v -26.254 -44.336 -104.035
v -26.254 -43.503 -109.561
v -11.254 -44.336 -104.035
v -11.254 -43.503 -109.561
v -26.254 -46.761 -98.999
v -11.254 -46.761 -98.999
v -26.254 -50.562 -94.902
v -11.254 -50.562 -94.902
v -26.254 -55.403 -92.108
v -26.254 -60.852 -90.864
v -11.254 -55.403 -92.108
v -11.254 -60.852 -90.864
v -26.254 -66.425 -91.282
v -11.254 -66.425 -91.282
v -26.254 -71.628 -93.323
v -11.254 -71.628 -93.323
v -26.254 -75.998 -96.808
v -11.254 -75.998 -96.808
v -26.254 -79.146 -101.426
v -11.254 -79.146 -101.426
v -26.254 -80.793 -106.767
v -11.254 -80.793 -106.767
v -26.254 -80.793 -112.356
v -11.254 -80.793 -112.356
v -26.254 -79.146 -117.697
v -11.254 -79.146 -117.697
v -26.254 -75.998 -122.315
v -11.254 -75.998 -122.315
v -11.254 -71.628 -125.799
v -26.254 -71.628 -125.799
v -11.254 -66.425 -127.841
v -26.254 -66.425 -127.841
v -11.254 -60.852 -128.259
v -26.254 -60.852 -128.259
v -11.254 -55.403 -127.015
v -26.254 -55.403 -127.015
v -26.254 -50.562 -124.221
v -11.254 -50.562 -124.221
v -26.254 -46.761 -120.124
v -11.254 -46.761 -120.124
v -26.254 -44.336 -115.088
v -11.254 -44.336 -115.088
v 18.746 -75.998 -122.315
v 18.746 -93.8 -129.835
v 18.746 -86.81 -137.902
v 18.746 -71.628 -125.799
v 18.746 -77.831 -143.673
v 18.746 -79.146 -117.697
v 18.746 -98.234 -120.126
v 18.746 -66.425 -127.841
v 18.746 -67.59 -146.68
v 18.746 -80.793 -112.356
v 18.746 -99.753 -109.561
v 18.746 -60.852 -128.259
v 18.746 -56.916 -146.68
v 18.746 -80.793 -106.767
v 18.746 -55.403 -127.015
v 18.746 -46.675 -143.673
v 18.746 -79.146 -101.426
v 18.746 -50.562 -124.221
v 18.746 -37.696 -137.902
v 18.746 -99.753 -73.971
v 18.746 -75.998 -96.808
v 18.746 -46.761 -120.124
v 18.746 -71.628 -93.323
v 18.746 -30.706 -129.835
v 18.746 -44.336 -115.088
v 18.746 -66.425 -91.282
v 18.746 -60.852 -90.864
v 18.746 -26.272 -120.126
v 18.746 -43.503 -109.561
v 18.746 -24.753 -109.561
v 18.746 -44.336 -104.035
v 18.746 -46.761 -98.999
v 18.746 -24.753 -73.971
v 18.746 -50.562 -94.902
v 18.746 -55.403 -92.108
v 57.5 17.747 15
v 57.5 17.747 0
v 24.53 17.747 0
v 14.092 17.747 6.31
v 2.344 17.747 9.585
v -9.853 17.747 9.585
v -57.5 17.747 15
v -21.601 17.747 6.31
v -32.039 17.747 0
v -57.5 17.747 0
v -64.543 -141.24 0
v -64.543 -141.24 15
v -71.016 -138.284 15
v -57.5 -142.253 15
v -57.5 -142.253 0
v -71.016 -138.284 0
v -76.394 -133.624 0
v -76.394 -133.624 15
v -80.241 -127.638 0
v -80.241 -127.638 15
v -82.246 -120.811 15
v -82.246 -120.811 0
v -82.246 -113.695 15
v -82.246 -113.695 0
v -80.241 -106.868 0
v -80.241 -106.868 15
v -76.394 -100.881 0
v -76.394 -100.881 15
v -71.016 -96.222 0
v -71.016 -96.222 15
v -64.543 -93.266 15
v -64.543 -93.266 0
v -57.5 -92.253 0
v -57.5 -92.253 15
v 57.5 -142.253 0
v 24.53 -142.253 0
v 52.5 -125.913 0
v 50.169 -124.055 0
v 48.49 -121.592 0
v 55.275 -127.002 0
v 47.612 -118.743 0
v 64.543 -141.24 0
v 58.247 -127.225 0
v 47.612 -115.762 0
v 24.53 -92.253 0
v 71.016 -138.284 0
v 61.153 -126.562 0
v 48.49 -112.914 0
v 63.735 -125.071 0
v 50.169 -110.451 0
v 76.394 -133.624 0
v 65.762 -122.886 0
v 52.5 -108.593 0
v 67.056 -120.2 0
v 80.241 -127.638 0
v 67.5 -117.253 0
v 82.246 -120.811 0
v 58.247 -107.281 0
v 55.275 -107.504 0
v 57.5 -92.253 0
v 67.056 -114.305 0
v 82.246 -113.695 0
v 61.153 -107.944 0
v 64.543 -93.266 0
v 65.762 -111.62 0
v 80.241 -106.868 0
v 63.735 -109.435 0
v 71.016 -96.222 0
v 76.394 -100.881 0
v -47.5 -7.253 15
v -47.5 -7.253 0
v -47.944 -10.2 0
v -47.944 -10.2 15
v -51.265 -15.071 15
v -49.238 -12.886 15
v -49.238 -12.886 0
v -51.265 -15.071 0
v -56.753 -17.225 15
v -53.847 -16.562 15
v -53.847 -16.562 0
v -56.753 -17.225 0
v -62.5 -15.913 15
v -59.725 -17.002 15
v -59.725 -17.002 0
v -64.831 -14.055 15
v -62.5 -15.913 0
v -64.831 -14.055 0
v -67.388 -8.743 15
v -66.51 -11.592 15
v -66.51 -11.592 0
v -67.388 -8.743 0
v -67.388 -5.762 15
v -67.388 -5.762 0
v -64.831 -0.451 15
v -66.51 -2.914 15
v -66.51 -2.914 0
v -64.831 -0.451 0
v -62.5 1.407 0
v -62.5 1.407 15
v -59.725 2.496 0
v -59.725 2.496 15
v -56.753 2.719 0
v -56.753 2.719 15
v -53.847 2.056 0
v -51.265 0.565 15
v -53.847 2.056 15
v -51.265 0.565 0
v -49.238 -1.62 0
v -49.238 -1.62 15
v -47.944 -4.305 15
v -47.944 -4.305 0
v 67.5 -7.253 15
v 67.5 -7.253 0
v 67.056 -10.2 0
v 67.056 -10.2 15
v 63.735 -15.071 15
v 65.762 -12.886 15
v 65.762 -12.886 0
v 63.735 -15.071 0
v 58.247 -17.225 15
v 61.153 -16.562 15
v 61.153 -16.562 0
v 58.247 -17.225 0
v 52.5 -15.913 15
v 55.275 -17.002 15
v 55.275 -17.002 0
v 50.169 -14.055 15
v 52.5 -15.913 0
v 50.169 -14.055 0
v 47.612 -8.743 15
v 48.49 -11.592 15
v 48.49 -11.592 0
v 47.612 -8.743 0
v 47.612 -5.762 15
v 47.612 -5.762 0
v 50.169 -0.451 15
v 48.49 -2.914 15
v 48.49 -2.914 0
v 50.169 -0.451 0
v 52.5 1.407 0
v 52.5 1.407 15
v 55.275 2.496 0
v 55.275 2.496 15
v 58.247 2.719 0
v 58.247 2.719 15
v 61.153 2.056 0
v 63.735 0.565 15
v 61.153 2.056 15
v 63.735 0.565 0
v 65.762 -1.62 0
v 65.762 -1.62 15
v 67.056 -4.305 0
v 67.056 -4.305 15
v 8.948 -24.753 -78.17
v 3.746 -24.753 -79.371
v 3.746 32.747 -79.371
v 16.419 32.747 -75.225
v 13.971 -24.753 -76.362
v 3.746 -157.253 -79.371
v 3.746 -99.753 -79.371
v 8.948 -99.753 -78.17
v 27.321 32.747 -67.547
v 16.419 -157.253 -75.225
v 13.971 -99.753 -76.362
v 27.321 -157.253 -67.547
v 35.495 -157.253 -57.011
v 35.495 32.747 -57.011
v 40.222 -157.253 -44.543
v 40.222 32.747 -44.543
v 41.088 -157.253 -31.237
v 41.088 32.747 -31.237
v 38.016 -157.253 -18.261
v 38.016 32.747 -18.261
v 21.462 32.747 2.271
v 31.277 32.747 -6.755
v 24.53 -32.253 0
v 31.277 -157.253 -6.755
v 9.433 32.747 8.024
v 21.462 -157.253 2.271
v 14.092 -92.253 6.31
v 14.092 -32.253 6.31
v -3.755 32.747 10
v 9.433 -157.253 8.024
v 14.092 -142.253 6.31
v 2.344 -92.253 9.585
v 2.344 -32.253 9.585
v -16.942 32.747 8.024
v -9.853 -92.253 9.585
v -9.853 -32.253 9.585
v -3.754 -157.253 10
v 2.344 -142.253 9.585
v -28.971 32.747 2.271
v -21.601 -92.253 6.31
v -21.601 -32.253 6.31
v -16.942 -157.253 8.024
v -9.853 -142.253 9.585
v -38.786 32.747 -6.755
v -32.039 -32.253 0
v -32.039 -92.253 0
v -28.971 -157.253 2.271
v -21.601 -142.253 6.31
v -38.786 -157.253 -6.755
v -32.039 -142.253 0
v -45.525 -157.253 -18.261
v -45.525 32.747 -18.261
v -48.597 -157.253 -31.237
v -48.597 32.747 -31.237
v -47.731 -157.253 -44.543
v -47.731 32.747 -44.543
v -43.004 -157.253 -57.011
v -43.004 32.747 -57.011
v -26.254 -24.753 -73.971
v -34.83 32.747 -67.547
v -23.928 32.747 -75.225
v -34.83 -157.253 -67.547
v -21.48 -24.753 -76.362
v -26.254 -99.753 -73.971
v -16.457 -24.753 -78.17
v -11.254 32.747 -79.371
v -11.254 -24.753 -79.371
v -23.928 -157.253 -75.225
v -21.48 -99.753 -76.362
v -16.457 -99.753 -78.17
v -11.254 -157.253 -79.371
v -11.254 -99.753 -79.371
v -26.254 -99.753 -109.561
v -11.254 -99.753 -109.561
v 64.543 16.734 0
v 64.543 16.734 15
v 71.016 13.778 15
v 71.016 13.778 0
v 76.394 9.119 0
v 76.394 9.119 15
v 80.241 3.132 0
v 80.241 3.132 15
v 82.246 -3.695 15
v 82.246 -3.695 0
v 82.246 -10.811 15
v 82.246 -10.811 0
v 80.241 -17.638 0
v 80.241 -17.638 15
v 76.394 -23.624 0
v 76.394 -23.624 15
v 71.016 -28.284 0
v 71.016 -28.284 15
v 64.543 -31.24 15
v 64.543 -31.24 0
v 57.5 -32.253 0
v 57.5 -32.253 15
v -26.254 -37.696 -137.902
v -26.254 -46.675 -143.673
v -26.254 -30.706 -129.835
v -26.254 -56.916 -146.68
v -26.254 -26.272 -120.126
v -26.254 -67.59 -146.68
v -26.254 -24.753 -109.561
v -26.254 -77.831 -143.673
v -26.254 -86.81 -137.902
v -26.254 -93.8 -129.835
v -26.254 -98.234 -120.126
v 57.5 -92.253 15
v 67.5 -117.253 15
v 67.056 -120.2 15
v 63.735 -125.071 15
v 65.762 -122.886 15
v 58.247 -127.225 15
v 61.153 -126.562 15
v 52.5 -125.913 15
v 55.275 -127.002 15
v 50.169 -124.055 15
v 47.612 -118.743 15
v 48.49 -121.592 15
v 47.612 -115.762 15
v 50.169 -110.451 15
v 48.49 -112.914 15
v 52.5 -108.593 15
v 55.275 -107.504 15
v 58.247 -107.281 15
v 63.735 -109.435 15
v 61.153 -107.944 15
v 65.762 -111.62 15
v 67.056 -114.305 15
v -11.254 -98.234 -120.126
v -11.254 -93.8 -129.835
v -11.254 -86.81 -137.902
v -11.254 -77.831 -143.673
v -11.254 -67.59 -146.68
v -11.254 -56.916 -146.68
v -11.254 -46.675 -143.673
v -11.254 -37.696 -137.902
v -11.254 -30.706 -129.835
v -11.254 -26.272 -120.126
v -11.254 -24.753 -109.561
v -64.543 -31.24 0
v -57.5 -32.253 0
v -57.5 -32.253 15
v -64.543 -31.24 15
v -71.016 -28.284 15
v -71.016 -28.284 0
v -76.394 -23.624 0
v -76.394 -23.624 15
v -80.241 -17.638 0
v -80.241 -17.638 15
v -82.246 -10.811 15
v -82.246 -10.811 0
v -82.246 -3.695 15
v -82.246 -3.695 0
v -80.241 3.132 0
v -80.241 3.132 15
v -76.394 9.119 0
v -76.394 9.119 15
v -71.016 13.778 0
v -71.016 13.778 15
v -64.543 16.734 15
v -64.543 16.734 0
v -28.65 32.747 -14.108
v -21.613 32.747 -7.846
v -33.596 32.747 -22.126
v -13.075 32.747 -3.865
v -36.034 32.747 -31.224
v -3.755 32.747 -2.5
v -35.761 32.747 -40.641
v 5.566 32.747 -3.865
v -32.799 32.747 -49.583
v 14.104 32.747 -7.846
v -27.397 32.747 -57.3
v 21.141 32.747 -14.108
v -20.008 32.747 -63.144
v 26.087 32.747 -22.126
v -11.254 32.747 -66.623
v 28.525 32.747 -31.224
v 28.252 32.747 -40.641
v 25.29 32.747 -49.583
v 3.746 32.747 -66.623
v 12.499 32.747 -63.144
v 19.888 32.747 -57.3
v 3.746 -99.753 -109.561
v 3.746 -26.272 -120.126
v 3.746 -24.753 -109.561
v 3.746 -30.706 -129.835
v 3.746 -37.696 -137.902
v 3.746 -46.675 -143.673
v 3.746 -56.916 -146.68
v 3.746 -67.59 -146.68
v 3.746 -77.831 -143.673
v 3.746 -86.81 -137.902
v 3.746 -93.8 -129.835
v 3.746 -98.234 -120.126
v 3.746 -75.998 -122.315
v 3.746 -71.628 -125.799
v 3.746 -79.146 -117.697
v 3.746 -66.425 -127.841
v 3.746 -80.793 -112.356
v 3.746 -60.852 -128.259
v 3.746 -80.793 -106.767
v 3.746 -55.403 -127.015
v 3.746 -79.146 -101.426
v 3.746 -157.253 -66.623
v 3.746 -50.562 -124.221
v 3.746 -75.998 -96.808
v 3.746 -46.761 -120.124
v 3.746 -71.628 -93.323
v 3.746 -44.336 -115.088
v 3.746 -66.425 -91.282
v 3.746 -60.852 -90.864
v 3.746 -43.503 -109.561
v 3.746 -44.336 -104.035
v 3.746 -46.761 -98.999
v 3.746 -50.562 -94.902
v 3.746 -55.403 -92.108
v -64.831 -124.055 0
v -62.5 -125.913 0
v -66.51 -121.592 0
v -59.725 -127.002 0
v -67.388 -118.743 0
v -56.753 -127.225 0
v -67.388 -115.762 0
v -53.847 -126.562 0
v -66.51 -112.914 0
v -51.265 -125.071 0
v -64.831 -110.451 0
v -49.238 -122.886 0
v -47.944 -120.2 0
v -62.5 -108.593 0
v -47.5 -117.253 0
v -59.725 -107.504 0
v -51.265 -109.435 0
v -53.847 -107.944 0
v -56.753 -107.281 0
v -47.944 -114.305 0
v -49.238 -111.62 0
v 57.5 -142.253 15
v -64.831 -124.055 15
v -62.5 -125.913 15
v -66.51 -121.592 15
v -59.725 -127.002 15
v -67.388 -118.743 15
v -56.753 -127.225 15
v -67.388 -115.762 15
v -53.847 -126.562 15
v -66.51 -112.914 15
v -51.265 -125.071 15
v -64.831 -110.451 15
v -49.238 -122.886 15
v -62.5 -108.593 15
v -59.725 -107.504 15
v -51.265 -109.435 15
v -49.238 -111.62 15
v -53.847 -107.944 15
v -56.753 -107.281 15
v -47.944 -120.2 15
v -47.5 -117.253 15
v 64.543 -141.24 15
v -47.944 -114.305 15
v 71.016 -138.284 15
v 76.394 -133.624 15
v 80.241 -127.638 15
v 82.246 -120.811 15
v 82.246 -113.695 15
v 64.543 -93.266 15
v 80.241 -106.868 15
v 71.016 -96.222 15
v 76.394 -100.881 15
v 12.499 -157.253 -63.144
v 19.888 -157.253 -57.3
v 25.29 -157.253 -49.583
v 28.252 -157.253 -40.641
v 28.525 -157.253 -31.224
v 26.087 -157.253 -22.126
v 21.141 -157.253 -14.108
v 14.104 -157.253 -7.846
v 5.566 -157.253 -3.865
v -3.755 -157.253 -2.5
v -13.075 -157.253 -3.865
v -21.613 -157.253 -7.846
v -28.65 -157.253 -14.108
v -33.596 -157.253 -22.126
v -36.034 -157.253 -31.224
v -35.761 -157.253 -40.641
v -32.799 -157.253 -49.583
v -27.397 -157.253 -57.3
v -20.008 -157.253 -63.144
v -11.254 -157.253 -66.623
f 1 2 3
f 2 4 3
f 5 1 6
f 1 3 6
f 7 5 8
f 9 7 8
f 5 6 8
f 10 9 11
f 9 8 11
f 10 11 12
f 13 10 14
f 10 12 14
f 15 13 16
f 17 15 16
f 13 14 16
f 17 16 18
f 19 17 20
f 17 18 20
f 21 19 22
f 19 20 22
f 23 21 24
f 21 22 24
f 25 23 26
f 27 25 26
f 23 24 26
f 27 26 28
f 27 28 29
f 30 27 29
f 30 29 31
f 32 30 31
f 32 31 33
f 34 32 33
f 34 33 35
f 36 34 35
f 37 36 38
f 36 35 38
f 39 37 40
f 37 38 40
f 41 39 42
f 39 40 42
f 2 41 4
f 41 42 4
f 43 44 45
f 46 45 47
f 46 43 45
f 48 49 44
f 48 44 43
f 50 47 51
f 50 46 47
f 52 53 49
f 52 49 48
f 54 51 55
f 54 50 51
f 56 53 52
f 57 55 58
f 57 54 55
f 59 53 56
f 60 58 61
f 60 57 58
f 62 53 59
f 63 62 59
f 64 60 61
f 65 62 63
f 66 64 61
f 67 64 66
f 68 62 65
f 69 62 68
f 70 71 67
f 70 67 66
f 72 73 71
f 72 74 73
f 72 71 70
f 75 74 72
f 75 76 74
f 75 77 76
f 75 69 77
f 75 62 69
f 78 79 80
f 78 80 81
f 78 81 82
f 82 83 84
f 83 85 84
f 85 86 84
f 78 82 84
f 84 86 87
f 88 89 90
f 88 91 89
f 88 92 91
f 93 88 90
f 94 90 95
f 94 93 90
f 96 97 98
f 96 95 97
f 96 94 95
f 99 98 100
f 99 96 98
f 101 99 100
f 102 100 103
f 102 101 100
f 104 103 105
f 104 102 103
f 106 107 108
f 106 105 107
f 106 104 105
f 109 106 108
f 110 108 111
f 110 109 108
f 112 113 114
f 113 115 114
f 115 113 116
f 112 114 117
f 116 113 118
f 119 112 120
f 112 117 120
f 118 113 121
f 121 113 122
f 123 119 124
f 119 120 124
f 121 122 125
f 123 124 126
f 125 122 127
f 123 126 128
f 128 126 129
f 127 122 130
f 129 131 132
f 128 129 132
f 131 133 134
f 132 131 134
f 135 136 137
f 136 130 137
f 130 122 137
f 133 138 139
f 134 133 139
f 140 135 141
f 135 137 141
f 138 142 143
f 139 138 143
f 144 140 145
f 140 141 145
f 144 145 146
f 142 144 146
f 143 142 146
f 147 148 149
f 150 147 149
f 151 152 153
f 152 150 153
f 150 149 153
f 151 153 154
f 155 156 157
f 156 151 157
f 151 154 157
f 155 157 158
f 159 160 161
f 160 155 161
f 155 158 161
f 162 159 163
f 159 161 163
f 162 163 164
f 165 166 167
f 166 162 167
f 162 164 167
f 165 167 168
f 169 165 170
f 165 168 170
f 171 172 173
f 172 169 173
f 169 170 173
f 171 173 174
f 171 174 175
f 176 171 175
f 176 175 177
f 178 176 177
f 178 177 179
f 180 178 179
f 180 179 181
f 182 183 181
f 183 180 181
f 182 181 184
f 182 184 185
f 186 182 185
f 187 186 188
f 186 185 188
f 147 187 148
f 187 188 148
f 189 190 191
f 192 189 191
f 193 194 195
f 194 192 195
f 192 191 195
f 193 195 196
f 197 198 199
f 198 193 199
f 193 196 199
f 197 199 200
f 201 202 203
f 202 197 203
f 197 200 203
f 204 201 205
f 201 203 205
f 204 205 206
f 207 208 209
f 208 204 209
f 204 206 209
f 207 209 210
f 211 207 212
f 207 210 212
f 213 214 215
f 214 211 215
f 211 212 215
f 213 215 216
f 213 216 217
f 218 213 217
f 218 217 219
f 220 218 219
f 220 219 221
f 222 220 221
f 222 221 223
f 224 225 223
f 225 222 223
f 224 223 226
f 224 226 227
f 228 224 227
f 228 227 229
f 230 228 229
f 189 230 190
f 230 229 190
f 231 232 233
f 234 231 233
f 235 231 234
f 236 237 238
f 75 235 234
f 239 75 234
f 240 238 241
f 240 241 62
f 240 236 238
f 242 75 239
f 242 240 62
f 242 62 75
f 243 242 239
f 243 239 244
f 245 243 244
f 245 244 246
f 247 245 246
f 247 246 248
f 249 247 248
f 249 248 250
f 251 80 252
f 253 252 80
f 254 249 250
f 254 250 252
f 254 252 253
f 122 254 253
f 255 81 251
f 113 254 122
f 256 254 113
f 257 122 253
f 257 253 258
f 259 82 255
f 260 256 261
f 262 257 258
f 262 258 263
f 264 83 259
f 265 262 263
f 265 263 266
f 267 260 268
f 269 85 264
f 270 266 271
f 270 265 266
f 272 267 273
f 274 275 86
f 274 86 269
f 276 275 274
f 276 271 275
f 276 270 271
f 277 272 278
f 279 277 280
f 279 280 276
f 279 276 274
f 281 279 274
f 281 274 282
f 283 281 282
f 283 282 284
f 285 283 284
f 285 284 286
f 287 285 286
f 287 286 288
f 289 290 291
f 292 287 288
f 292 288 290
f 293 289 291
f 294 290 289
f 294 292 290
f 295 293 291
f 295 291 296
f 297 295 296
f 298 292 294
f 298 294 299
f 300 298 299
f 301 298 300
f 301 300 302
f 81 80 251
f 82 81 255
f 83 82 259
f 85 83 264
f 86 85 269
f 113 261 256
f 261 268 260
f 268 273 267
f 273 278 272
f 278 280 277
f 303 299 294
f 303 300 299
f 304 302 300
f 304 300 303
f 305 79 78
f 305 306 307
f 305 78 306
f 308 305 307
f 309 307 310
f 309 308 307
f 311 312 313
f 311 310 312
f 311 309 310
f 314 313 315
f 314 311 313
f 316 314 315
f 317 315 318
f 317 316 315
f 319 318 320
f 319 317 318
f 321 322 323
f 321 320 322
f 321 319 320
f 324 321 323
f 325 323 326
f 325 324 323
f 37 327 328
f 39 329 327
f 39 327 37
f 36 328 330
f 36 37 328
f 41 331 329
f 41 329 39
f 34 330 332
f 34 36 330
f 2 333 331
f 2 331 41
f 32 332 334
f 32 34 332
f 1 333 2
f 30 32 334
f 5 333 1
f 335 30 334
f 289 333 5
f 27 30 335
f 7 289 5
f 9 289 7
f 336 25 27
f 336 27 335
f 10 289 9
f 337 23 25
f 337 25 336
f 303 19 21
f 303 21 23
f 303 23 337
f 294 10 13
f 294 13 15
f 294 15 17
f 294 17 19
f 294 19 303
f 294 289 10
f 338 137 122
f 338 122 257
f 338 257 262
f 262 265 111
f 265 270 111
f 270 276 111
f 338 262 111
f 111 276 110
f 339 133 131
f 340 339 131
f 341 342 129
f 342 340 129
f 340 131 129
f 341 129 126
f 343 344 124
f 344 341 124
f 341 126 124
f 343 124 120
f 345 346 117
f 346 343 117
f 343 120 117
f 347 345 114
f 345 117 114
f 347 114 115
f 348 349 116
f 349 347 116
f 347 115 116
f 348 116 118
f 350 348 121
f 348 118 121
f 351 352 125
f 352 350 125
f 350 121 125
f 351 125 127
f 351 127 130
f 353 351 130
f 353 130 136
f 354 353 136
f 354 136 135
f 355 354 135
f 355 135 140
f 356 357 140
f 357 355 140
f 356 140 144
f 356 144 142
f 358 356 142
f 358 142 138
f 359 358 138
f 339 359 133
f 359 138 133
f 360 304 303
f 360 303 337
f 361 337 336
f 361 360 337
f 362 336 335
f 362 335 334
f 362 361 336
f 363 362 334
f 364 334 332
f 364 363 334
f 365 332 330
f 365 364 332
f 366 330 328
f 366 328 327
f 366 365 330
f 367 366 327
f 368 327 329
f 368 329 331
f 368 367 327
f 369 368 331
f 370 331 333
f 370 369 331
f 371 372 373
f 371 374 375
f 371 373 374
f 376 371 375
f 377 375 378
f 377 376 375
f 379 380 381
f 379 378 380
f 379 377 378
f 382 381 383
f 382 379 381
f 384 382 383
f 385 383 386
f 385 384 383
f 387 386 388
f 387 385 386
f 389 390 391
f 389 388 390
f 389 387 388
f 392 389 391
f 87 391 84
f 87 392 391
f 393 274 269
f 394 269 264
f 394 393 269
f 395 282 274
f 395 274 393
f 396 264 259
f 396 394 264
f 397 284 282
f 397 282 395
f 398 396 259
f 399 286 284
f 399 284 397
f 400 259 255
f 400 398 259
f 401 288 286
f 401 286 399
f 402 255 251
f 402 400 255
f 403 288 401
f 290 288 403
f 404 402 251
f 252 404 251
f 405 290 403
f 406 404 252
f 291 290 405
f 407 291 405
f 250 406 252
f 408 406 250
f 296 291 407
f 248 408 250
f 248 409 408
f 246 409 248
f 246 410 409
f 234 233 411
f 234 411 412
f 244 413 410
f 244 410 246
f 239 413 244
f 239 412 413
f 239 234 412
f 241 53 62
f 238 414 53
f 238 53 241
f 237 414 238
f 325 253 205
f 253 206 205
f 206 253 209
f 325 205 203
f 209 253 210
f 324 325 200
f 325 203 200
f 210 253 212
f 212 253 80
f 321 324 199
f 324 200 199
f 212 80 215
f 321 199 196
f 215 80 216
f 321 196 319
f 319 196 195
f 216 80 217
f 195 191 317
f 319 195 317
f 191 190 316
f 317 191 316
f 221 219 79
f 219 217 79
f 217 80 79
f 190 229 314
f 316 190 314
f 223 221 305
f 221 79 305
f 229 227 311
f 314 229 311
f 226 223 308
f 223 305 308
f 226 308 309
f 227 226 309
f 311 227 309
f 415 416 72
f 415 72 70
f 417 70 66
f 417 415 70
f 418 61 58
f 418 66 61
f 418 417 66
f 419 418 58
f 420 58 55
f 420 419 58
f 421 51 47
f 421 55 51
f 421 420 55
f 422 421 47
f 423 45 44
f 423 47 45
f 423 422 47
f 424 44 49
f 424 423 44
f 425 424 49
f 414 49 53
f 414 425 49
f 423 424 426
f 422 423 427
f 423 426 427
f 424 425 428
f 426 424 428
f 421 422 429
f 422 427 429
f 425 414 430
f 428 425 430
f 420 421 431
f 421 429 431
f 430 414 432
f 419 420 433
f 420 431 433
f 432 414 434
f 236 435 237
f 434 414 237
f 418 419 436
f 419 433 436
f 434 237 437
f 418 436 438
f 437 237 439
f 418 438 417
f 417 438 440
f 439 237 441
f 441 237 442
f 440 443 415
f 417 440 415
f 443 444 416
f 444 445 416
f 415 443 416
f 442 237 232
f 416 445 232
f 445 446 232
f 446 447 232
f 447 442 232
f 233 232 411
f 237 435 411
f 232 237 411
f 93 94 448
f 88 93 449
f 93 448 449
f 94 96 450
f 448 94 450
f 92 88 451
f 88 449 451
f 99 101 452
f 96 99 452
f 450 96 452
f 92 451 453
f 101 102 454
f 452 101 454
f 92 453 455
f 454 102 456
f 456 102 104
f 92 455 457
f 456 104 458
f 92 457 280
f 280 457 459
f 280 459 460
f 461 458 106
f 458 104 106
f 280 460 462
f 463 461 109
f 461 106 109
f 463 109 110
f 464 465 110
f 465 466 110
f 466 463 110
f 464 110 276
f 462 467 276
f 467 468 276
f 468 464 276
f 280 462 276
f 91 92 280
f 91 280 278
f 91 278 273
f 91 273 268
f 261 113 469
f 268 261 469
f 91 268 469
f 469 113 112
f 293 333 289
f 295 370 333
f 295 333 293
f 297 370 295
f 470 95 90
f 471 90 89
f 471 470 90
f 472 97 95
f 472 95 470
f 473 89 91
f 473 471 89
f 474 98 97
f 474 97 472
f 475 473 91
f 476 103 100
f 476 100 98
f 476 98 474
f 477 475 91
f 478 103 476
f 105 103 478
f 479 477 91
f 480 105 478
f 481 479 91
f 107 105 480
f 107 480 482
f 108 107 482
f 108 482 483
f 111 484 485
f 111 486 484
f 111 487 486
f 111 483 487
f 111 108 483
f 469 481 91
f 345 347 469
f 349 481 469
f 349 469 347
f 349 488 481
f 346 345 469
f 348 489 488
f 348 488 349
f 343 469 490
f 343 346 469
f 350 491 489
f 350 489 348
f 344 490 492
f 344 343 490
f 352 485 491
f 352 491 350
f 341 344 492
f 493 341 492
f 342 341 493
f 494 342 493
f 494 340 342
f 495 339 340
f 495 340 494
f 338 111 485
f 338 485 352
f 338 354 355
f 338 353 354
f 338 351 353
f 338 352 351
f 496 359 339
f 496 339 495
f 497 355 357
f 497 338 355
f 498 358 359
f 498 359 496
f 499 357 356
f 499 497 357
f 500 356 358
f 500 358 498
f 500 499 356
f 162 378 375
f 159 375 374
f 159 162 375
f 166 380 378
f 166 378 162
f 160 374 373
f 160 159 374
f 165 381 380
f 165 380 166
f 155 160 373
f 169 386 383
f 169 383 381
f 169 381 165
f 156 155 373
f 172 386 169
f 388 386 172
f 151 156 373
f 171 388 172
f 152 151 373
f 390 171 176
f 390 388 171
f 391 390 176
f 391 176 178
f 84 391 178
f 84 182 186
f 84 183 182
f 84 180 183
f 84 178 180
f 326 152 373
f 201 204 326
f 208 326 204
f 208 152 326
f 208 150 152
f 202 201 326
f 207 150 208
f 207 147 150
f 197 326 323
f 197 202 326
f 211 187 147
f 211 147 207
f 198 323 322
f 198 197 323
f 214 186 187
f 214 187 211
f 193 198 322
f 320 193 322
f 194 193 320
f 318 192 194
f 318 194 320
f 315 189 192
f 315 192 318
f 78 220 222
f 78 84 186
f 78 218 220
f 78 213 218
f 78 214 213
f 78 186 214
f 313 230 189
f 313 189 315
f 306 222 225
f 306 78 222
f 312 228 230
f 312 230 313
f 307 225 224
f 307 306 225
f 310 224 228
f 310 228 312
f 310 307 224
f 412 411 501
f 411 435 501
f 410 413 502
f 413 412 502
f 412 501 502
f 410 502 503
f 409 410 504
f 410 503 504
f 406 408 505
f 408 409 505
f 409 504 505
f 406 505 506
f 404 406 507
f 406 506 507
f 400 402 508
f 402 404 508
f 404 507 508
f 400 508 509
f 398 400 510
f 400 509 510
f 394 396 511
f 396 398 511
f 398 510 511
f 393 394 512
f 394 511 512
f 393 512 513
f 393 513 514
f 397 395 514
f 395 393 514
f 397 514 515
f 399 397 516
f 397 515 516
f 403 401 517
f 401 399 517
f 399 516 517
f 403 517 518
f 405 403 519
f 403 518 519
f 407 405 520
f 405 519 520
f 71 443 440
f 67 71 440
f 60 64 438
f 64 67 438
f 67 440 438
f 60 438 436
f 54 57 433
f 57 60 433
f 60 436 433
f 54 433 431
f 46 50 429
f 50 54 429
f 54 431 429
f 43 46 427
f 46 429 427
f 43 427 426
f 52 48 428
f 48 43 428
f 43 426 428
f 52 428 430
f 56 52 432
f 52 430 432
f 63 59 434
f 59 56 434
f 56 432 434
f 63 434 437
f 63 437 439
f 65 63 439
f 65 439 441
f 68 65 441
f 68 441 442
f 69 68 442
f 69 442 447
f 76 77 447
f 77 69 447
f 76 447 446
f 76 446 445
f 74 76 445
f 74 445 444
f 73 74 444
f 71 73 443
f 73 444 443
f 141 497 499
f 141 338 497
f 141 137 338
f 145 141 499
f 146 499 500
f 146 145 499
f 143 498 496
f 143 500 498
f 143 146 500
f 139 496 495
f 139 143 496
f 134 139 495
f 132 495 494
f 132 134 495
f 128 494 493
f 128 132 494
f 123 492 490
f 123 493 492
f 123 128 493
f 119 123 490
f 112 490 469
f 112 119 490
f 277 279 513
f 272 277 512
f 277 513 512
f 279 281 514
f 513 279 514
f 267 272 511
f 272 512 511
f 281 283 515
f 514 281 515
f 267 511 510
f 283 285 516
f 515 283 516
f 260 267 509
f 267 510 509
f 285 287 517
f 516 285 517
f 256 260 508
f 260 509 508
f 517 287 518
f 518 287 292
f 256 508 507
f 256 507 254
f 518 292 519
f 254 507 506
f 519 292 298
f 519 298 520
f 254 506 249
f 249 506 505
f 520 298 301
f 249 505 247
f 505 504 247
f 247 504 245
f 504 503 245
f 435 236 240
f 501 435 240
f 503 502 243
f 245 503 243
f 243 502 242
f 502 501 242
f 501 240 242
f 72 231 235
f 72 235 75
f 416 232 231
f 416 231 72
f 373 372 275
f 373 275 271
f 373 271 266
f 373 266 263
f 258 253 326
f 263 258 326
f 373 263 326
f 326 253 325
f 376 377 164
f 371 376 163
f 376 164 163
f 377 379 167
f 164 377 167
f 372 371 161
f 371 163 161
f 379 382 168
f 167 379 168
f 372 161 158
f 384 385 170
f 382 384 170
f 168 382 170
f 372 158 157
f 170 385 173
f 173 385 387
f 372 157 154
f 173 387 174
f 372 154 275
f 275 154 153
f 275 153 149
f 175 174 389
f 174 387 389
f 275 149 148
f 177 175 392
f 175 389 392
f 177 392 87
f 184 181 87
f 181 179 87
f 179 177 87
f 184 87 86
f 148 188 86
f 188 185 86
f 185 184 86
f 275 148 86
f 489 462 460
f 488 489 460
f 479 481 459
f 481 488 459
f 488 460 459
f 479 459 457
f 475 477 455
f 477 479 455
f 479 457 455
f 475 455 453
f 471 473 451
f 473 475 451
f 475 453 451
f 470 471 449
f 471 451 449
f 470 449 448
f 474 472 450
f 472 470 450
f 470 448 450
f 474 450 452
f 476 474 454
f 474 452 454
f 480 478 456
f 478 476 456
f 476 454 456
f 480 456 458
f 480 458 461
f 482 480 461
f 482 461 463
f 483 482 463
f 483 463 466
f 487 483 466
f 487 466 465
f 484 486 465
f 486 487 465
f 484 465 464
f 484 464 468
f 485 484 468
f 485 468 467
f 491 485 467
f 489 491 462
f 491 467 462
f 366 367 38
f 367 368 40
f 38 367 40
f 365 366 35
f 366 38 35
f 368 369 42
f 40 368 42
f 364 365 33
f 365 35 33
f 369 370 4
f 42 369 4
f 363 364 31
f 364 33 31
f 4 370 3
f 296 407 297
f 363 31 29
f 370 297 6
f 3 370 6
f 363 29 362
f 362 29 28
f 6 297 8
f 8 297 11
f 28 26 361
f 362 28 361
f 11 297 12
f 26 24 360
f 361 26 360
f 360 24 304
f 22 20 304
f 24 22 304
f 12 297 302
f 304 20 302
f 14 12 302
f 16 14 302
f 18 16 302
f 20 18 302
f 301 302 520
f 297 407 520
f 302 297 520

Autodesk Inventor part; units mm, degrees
ref_plane "YZ Plane" through (0, 0, 0) normal (1, 0, 0) x (0, 1, 0)
sketch "Sketch1" plane through (0, 0, 0) normal (0, 0, 1) x (1, 0, 0)
  line L0 (-57.5, -7.2529) -> (57.5, -7.2529) construction
  line L1 (-57.5, -32.2529) -> (57.5, -32.2529)
  line L2 (57.5, 17.7471) -> (-57.5, 17.7471)
  arc A0 (-57.5, 17.7471) -> (-57.5, -32.2529) centre (-57.5, -7.2529) ccw
  arc A1 (57.5, -32.2529) -> (57.5, 17.7471) centre (57.5, -7.2529) ccw
  circle A2 centre (-57.5, -7.2529) radius 10
  circle A3 centre (57.5, -7.2529) radius 10
  line L3 (-57.5, -117.2529) -> (57.5, -117.2529) construction
  line L4 (-57.5, -142.2529) -> (57.5, -142.2529)
  line L5 (57.5, -92.2529) -> (-57.5, -92.2529)
  arc A4 (-57.5, -92.2529) -> (-57.5, -142.2529) centre (-57.5, -117.2529) ccw
  arc A5 (57.5, -142.2529) -> (57.5, -92.2529) centre (57.5, -117.2529) ccw
  circle A6 centre (-57.5, -117.2529) radius 10
  circle A7 centre (57.5, -117.2529) radius 10
  point P0 (0, 0)
  point P1 (0, -7.2529)
  point P2 (0, -117.2529)
  point P3 (82.5, -117.2529)
  point P4 (-82.5, -117.2529)
  dimension "d0" = 115
  dimension "d1" = 25
  dimension "d2" = 20
  dimension "d3" = 20
  dimension "d4" = 115
  dimension "d5" = 25
  dimension "d6" = 20
  dimension "d7" = 20
  dimension "d8" = 110
  dimension "d11" = 165
extrude "Extrusion1" add sketch "Sketch1" along normal blind 15
sketch "Sketch2" plane through (0, 0, 0) normal (0, 0, -1) x (-1, 0, 0)
  point P0 (0, 0)
sketch "Sketch3" plane through (0, 0, 0) normal (0, 0, -1) x (-1, 0, 0)
  point P0 (0, 0)
sketch "Sketch4" plane through (-57.5, 17.7471, 0) normal (0, 1, 0) x (1, 0, 0)
  arc A0 (46.2455, 79.3706) -> (61.2455, 79.3706) centre (53.7455, 35) ccw
  line L0 (115, 0) -> (0, 0) projected
  arc A1 (46.2455, 66.6228) -> (61.2455, 66.6228) centre (53.7455, 35) ccw
  line L1 (46.2455, -10) -> (61.2455, 80) construction
  line L2 (61.2455, -10) -> (46.2455, 80) construction
  line L3 (46.2455, 79.3706) -> (46.2455, 66.6228)
  line L4 (61.2455, 66.6228) -> (61.2455, 79.3706)
  point P0 (57.5, 0)
  dimension "d12" = 90
  dimension "d13" = 35
  dimension "d14" = 65
  dimension "d15" = 15
  dimension "d16" = 90
extrude "Extrusion2" add sketch "Sketch4" along normal blind 15 and the other way blind 175
sketch "Sketch5" plane through (0, 0, 0) normal (1, 0, 0) x (0, 1, 0)
  point P0 (0, 0)
ref_plane "Work Plane1" through (3.7455, 17.7471, -79.3706) normal (1, 0, 0) x (0, 1, 0)
sketch "Sketch6" plane through (3.7455, 17.7471, -79.3706) normal (1, 0, 0) x (0, 1, 0)
  circle A0 centre (-80, -30.1908) radius 18.75
  arc A1 (-117.5, -30.1908) -> (-42.5, -30.1908) centre (-80, -30.1908) ccw
  line L0 (-117.5, -30.1908) -> (-117.5, 12.3826)
  line L1 (-117.5, 12.3826) -> (-42.5, 12.3826)
  line L2 (-42.5, 12.3826) -> (-42.5, -30.1908)
  point P0 (-17.7471, 79.3706)
  dimension "d21" = 37.5
  dimension "d22" = 75
extrude "Extrusion3" add sketch "Sketch6" along normal blind 15
ref_plane "Work Plane2" through (-3.7545, -157.2529, -79.3706) normal (1, 0, 0) x (0, 0, -1)
mirror "Mirror1" about plane through (-3.7545, -157.2529, -79.3706) normal (1, 0, 0) of "Extrusion3"
properties part number "cad@68"
